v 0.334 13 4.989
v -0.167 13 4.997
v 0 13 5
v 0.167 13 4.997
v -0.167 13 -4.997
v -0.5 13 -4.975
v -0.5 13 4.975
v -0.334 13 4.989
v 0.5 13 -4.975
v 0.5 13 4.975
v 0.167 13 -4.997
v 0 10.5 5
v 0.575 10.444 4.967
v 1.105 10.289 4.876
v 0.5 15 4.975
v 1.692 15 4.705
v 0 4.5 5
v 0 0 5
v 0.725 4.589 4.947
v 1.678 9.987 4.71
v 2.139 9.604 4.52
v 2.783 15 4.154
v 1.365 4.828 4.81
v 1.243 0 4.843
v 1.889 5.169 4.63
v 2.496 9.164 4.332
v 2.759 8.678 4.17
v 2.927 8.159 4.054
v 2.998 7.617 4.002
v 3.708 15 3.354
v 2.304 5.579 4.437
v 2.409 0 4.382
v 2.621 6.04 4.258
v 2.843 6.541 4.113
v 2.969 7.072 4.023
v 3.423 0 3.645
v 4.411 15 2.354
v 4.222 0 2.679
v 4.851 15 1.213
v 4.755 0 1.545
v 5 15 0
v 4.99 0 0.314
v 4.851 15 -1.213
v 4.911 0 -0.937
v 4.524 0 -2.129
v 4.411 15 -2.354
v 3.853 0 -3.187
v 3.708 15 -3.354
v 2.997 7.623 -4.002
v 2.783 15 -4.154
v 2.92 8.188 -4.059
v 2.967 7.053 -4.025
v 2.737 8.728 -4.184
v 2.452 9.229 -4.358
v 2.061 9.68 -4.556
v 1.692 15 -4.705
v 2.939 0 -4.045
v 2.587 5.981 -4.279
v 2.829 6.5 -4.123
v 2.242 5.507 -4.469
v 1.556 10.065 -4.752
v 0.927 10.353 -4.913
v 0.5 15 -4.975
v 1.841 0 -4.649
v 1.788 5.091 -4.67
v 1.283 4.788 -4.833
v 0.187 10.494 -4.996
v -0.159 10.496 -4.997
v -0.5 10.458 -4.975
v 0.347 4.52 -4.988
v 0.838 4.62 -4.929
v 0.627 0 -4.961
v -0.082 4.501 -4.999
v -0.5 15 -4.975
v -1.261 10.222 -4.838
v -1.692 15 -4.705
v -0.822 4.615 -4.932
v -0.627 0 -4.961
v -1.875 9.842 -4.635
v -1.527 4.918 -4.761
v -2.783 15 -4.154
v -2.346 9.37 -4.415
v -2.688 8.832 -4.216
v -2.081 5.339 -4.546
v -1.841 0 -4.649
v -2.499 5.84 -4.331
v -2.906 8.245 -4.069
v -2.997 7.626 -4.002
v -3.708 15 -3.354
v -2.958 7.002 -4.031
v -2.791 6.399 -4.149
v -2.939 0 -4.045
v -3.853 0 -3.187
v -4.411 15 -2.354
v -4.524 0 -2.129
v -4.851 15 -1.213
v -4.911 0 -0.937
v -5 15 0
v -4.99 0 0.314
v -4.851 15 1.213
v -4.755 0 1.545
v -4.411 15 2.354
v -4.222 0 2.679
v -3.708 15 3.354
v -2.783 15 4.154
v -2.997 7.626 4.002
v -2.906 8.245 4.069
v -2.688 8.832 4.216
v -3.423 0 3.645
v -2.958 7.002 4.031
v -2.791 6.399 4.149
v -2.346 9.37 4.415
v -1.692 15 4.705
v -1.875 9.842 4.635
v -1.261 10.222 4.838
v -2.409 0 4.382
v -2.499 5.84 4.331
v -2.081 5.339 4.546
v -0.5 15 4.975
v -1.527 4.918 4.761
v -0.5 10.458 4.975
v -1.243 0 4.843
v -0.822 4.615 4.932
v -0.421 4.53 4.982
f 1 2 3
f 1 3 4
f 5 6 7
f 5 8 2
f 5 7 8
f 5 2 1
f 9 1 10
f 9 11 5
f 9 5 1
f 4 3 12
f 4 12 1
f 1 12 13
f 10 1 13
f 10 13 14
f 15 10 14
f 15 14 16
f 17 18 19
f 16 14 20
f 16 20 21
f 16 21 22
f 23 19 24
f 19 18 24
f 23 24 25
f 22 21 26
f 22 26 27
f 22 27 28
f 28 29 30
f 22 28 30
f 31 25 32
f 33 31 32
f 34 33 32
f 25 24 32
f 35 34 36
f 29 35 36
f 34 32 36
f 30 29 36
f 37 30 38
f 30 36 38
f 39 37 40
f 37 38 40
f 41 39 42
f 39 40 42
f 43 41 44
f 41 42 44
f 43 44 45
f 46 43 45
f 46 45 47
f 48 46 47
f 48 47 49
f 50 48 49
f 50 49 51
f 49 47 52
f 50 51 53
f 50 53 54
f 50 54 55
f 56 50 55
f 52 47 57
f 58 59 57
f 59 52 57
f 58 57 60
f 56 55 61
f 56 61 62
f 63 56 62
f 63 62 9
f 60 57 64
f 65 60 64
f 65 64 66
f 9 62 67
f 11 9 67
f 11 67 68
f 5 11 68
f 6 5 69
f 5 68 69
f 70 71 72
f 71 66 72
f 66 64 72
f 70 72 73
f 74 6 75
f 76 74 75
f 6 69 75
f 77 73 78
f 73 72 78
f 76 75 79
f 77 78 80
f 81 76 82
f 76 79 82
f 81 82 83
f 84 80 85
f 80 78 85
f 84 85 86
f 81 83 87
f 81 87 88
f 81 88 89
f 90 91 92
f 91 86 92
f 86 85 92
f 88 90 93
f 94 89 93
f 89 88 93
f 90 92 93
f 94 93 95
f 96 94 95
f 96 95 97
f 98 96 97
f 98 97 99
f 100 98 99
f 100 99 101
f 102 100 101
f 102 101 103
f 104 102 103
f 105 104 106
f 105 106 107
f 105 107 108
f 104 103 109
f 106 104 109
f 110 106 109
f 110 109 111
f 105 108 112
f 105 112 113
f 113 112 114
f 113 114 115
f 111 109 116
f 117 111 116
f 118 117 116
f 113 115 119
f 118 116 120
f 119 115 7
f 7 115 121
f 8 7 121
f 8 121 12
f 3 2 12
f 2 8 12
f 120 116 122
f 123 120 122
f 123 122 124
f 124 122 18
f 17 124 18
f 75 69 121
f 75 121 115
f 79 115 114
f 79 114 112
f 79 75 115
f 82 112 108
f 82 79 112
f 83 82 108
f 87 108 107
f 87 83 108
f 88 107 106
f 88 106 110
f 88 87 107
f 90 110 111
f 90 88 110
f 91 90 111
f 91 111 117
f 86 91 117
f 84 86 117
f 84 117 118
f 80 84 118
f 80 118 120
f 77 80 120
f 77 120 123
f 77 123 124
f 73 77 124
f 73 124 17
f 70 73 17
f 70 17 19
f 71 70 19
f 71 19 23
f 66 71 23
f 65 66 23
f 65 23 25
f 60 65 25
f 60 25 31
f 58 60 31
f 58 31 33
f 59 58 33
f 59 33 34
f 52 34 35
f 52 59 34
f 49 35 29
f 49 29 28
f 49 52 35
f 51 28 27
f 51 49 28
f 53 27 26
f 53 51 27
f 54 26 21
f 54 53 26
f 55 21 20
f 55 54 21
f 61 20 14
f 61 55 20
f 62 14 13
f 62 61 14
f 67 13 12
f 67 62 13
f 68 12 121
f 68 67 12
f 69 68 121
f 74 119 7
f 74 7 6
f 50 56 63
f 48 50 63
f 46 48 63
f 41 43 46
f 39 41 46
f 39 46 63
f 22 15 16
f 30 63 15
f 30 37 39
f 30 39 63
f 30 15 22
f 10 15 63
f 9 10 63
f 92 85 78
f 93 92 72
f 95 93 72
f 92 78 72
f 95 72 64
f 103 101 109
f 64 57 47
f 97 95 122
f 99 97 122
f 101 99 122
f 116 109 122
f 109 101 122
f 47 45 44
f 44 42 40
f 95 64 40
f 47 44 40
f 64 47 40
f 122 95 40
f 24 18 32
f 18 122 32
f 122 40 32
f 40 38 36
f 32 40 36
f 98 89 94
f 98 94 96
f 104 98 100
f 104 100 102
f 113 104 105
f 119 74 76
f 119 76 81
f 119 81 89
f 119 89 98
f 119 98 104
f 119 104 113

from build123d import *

# Parameters (mm, degrees)
SKETCH_1_R               = 5
EXTRUDE_1_DEPTH          = 15
SKETCH_2_W               = 1
SKETCH_2_H               = 10
CUT_EXTRUDE_1_DEPTH      = 2
CUT_EXTRUDE_2_DEPTH      = 5
CUT_EXTRUDE_2_DEPTH_BACK = 5
SKETCH_3_R               = 3


with BuildPart() as part:
    # Эскиз1 → Бобышка-Вытянуть1 (new body)
    with BuildSketch(Plane(origin=(0, 0, 0), x_dir=(1, 0, 0), z_dir=(0, 1, 0))):
        Circle(SKETCH_1_R)
    extrude(amount=EXTRUDE_1_DEPTH)

    # Эскиз2 → Вырез-Вытянуть1 (cut)
    with BuildSketch(Plane(origin=(0, 15, 0), x_dir=(1, 0, 0), z_dir=(0, 1, 0))):
        Rectangle(SKETCH_2_W, SKETCH_2_H)
    extrude(amount=-CUT_EXTRUDE_1_DEPTH, mode=Mode.SUBTRACT)

    # Эскиз3 → Вырез-Вытянуть2 (cut, two sides: drawn at the far end of the back side and taken through both)
    with BuildSketch(Plane.XY.offset(-CUT_EXTRUDE_2_DEPTH_BACK)):
        with Locations((0, 7.5)):
            Circle(SKETCH_3_R)
    extrude(amount=CUT_EXTRUDE_2_DEPTH + CUT_EXTRUDE_2_DEPTH_BACK, mode=Mode.SUBTRACT)


solid = part.part
